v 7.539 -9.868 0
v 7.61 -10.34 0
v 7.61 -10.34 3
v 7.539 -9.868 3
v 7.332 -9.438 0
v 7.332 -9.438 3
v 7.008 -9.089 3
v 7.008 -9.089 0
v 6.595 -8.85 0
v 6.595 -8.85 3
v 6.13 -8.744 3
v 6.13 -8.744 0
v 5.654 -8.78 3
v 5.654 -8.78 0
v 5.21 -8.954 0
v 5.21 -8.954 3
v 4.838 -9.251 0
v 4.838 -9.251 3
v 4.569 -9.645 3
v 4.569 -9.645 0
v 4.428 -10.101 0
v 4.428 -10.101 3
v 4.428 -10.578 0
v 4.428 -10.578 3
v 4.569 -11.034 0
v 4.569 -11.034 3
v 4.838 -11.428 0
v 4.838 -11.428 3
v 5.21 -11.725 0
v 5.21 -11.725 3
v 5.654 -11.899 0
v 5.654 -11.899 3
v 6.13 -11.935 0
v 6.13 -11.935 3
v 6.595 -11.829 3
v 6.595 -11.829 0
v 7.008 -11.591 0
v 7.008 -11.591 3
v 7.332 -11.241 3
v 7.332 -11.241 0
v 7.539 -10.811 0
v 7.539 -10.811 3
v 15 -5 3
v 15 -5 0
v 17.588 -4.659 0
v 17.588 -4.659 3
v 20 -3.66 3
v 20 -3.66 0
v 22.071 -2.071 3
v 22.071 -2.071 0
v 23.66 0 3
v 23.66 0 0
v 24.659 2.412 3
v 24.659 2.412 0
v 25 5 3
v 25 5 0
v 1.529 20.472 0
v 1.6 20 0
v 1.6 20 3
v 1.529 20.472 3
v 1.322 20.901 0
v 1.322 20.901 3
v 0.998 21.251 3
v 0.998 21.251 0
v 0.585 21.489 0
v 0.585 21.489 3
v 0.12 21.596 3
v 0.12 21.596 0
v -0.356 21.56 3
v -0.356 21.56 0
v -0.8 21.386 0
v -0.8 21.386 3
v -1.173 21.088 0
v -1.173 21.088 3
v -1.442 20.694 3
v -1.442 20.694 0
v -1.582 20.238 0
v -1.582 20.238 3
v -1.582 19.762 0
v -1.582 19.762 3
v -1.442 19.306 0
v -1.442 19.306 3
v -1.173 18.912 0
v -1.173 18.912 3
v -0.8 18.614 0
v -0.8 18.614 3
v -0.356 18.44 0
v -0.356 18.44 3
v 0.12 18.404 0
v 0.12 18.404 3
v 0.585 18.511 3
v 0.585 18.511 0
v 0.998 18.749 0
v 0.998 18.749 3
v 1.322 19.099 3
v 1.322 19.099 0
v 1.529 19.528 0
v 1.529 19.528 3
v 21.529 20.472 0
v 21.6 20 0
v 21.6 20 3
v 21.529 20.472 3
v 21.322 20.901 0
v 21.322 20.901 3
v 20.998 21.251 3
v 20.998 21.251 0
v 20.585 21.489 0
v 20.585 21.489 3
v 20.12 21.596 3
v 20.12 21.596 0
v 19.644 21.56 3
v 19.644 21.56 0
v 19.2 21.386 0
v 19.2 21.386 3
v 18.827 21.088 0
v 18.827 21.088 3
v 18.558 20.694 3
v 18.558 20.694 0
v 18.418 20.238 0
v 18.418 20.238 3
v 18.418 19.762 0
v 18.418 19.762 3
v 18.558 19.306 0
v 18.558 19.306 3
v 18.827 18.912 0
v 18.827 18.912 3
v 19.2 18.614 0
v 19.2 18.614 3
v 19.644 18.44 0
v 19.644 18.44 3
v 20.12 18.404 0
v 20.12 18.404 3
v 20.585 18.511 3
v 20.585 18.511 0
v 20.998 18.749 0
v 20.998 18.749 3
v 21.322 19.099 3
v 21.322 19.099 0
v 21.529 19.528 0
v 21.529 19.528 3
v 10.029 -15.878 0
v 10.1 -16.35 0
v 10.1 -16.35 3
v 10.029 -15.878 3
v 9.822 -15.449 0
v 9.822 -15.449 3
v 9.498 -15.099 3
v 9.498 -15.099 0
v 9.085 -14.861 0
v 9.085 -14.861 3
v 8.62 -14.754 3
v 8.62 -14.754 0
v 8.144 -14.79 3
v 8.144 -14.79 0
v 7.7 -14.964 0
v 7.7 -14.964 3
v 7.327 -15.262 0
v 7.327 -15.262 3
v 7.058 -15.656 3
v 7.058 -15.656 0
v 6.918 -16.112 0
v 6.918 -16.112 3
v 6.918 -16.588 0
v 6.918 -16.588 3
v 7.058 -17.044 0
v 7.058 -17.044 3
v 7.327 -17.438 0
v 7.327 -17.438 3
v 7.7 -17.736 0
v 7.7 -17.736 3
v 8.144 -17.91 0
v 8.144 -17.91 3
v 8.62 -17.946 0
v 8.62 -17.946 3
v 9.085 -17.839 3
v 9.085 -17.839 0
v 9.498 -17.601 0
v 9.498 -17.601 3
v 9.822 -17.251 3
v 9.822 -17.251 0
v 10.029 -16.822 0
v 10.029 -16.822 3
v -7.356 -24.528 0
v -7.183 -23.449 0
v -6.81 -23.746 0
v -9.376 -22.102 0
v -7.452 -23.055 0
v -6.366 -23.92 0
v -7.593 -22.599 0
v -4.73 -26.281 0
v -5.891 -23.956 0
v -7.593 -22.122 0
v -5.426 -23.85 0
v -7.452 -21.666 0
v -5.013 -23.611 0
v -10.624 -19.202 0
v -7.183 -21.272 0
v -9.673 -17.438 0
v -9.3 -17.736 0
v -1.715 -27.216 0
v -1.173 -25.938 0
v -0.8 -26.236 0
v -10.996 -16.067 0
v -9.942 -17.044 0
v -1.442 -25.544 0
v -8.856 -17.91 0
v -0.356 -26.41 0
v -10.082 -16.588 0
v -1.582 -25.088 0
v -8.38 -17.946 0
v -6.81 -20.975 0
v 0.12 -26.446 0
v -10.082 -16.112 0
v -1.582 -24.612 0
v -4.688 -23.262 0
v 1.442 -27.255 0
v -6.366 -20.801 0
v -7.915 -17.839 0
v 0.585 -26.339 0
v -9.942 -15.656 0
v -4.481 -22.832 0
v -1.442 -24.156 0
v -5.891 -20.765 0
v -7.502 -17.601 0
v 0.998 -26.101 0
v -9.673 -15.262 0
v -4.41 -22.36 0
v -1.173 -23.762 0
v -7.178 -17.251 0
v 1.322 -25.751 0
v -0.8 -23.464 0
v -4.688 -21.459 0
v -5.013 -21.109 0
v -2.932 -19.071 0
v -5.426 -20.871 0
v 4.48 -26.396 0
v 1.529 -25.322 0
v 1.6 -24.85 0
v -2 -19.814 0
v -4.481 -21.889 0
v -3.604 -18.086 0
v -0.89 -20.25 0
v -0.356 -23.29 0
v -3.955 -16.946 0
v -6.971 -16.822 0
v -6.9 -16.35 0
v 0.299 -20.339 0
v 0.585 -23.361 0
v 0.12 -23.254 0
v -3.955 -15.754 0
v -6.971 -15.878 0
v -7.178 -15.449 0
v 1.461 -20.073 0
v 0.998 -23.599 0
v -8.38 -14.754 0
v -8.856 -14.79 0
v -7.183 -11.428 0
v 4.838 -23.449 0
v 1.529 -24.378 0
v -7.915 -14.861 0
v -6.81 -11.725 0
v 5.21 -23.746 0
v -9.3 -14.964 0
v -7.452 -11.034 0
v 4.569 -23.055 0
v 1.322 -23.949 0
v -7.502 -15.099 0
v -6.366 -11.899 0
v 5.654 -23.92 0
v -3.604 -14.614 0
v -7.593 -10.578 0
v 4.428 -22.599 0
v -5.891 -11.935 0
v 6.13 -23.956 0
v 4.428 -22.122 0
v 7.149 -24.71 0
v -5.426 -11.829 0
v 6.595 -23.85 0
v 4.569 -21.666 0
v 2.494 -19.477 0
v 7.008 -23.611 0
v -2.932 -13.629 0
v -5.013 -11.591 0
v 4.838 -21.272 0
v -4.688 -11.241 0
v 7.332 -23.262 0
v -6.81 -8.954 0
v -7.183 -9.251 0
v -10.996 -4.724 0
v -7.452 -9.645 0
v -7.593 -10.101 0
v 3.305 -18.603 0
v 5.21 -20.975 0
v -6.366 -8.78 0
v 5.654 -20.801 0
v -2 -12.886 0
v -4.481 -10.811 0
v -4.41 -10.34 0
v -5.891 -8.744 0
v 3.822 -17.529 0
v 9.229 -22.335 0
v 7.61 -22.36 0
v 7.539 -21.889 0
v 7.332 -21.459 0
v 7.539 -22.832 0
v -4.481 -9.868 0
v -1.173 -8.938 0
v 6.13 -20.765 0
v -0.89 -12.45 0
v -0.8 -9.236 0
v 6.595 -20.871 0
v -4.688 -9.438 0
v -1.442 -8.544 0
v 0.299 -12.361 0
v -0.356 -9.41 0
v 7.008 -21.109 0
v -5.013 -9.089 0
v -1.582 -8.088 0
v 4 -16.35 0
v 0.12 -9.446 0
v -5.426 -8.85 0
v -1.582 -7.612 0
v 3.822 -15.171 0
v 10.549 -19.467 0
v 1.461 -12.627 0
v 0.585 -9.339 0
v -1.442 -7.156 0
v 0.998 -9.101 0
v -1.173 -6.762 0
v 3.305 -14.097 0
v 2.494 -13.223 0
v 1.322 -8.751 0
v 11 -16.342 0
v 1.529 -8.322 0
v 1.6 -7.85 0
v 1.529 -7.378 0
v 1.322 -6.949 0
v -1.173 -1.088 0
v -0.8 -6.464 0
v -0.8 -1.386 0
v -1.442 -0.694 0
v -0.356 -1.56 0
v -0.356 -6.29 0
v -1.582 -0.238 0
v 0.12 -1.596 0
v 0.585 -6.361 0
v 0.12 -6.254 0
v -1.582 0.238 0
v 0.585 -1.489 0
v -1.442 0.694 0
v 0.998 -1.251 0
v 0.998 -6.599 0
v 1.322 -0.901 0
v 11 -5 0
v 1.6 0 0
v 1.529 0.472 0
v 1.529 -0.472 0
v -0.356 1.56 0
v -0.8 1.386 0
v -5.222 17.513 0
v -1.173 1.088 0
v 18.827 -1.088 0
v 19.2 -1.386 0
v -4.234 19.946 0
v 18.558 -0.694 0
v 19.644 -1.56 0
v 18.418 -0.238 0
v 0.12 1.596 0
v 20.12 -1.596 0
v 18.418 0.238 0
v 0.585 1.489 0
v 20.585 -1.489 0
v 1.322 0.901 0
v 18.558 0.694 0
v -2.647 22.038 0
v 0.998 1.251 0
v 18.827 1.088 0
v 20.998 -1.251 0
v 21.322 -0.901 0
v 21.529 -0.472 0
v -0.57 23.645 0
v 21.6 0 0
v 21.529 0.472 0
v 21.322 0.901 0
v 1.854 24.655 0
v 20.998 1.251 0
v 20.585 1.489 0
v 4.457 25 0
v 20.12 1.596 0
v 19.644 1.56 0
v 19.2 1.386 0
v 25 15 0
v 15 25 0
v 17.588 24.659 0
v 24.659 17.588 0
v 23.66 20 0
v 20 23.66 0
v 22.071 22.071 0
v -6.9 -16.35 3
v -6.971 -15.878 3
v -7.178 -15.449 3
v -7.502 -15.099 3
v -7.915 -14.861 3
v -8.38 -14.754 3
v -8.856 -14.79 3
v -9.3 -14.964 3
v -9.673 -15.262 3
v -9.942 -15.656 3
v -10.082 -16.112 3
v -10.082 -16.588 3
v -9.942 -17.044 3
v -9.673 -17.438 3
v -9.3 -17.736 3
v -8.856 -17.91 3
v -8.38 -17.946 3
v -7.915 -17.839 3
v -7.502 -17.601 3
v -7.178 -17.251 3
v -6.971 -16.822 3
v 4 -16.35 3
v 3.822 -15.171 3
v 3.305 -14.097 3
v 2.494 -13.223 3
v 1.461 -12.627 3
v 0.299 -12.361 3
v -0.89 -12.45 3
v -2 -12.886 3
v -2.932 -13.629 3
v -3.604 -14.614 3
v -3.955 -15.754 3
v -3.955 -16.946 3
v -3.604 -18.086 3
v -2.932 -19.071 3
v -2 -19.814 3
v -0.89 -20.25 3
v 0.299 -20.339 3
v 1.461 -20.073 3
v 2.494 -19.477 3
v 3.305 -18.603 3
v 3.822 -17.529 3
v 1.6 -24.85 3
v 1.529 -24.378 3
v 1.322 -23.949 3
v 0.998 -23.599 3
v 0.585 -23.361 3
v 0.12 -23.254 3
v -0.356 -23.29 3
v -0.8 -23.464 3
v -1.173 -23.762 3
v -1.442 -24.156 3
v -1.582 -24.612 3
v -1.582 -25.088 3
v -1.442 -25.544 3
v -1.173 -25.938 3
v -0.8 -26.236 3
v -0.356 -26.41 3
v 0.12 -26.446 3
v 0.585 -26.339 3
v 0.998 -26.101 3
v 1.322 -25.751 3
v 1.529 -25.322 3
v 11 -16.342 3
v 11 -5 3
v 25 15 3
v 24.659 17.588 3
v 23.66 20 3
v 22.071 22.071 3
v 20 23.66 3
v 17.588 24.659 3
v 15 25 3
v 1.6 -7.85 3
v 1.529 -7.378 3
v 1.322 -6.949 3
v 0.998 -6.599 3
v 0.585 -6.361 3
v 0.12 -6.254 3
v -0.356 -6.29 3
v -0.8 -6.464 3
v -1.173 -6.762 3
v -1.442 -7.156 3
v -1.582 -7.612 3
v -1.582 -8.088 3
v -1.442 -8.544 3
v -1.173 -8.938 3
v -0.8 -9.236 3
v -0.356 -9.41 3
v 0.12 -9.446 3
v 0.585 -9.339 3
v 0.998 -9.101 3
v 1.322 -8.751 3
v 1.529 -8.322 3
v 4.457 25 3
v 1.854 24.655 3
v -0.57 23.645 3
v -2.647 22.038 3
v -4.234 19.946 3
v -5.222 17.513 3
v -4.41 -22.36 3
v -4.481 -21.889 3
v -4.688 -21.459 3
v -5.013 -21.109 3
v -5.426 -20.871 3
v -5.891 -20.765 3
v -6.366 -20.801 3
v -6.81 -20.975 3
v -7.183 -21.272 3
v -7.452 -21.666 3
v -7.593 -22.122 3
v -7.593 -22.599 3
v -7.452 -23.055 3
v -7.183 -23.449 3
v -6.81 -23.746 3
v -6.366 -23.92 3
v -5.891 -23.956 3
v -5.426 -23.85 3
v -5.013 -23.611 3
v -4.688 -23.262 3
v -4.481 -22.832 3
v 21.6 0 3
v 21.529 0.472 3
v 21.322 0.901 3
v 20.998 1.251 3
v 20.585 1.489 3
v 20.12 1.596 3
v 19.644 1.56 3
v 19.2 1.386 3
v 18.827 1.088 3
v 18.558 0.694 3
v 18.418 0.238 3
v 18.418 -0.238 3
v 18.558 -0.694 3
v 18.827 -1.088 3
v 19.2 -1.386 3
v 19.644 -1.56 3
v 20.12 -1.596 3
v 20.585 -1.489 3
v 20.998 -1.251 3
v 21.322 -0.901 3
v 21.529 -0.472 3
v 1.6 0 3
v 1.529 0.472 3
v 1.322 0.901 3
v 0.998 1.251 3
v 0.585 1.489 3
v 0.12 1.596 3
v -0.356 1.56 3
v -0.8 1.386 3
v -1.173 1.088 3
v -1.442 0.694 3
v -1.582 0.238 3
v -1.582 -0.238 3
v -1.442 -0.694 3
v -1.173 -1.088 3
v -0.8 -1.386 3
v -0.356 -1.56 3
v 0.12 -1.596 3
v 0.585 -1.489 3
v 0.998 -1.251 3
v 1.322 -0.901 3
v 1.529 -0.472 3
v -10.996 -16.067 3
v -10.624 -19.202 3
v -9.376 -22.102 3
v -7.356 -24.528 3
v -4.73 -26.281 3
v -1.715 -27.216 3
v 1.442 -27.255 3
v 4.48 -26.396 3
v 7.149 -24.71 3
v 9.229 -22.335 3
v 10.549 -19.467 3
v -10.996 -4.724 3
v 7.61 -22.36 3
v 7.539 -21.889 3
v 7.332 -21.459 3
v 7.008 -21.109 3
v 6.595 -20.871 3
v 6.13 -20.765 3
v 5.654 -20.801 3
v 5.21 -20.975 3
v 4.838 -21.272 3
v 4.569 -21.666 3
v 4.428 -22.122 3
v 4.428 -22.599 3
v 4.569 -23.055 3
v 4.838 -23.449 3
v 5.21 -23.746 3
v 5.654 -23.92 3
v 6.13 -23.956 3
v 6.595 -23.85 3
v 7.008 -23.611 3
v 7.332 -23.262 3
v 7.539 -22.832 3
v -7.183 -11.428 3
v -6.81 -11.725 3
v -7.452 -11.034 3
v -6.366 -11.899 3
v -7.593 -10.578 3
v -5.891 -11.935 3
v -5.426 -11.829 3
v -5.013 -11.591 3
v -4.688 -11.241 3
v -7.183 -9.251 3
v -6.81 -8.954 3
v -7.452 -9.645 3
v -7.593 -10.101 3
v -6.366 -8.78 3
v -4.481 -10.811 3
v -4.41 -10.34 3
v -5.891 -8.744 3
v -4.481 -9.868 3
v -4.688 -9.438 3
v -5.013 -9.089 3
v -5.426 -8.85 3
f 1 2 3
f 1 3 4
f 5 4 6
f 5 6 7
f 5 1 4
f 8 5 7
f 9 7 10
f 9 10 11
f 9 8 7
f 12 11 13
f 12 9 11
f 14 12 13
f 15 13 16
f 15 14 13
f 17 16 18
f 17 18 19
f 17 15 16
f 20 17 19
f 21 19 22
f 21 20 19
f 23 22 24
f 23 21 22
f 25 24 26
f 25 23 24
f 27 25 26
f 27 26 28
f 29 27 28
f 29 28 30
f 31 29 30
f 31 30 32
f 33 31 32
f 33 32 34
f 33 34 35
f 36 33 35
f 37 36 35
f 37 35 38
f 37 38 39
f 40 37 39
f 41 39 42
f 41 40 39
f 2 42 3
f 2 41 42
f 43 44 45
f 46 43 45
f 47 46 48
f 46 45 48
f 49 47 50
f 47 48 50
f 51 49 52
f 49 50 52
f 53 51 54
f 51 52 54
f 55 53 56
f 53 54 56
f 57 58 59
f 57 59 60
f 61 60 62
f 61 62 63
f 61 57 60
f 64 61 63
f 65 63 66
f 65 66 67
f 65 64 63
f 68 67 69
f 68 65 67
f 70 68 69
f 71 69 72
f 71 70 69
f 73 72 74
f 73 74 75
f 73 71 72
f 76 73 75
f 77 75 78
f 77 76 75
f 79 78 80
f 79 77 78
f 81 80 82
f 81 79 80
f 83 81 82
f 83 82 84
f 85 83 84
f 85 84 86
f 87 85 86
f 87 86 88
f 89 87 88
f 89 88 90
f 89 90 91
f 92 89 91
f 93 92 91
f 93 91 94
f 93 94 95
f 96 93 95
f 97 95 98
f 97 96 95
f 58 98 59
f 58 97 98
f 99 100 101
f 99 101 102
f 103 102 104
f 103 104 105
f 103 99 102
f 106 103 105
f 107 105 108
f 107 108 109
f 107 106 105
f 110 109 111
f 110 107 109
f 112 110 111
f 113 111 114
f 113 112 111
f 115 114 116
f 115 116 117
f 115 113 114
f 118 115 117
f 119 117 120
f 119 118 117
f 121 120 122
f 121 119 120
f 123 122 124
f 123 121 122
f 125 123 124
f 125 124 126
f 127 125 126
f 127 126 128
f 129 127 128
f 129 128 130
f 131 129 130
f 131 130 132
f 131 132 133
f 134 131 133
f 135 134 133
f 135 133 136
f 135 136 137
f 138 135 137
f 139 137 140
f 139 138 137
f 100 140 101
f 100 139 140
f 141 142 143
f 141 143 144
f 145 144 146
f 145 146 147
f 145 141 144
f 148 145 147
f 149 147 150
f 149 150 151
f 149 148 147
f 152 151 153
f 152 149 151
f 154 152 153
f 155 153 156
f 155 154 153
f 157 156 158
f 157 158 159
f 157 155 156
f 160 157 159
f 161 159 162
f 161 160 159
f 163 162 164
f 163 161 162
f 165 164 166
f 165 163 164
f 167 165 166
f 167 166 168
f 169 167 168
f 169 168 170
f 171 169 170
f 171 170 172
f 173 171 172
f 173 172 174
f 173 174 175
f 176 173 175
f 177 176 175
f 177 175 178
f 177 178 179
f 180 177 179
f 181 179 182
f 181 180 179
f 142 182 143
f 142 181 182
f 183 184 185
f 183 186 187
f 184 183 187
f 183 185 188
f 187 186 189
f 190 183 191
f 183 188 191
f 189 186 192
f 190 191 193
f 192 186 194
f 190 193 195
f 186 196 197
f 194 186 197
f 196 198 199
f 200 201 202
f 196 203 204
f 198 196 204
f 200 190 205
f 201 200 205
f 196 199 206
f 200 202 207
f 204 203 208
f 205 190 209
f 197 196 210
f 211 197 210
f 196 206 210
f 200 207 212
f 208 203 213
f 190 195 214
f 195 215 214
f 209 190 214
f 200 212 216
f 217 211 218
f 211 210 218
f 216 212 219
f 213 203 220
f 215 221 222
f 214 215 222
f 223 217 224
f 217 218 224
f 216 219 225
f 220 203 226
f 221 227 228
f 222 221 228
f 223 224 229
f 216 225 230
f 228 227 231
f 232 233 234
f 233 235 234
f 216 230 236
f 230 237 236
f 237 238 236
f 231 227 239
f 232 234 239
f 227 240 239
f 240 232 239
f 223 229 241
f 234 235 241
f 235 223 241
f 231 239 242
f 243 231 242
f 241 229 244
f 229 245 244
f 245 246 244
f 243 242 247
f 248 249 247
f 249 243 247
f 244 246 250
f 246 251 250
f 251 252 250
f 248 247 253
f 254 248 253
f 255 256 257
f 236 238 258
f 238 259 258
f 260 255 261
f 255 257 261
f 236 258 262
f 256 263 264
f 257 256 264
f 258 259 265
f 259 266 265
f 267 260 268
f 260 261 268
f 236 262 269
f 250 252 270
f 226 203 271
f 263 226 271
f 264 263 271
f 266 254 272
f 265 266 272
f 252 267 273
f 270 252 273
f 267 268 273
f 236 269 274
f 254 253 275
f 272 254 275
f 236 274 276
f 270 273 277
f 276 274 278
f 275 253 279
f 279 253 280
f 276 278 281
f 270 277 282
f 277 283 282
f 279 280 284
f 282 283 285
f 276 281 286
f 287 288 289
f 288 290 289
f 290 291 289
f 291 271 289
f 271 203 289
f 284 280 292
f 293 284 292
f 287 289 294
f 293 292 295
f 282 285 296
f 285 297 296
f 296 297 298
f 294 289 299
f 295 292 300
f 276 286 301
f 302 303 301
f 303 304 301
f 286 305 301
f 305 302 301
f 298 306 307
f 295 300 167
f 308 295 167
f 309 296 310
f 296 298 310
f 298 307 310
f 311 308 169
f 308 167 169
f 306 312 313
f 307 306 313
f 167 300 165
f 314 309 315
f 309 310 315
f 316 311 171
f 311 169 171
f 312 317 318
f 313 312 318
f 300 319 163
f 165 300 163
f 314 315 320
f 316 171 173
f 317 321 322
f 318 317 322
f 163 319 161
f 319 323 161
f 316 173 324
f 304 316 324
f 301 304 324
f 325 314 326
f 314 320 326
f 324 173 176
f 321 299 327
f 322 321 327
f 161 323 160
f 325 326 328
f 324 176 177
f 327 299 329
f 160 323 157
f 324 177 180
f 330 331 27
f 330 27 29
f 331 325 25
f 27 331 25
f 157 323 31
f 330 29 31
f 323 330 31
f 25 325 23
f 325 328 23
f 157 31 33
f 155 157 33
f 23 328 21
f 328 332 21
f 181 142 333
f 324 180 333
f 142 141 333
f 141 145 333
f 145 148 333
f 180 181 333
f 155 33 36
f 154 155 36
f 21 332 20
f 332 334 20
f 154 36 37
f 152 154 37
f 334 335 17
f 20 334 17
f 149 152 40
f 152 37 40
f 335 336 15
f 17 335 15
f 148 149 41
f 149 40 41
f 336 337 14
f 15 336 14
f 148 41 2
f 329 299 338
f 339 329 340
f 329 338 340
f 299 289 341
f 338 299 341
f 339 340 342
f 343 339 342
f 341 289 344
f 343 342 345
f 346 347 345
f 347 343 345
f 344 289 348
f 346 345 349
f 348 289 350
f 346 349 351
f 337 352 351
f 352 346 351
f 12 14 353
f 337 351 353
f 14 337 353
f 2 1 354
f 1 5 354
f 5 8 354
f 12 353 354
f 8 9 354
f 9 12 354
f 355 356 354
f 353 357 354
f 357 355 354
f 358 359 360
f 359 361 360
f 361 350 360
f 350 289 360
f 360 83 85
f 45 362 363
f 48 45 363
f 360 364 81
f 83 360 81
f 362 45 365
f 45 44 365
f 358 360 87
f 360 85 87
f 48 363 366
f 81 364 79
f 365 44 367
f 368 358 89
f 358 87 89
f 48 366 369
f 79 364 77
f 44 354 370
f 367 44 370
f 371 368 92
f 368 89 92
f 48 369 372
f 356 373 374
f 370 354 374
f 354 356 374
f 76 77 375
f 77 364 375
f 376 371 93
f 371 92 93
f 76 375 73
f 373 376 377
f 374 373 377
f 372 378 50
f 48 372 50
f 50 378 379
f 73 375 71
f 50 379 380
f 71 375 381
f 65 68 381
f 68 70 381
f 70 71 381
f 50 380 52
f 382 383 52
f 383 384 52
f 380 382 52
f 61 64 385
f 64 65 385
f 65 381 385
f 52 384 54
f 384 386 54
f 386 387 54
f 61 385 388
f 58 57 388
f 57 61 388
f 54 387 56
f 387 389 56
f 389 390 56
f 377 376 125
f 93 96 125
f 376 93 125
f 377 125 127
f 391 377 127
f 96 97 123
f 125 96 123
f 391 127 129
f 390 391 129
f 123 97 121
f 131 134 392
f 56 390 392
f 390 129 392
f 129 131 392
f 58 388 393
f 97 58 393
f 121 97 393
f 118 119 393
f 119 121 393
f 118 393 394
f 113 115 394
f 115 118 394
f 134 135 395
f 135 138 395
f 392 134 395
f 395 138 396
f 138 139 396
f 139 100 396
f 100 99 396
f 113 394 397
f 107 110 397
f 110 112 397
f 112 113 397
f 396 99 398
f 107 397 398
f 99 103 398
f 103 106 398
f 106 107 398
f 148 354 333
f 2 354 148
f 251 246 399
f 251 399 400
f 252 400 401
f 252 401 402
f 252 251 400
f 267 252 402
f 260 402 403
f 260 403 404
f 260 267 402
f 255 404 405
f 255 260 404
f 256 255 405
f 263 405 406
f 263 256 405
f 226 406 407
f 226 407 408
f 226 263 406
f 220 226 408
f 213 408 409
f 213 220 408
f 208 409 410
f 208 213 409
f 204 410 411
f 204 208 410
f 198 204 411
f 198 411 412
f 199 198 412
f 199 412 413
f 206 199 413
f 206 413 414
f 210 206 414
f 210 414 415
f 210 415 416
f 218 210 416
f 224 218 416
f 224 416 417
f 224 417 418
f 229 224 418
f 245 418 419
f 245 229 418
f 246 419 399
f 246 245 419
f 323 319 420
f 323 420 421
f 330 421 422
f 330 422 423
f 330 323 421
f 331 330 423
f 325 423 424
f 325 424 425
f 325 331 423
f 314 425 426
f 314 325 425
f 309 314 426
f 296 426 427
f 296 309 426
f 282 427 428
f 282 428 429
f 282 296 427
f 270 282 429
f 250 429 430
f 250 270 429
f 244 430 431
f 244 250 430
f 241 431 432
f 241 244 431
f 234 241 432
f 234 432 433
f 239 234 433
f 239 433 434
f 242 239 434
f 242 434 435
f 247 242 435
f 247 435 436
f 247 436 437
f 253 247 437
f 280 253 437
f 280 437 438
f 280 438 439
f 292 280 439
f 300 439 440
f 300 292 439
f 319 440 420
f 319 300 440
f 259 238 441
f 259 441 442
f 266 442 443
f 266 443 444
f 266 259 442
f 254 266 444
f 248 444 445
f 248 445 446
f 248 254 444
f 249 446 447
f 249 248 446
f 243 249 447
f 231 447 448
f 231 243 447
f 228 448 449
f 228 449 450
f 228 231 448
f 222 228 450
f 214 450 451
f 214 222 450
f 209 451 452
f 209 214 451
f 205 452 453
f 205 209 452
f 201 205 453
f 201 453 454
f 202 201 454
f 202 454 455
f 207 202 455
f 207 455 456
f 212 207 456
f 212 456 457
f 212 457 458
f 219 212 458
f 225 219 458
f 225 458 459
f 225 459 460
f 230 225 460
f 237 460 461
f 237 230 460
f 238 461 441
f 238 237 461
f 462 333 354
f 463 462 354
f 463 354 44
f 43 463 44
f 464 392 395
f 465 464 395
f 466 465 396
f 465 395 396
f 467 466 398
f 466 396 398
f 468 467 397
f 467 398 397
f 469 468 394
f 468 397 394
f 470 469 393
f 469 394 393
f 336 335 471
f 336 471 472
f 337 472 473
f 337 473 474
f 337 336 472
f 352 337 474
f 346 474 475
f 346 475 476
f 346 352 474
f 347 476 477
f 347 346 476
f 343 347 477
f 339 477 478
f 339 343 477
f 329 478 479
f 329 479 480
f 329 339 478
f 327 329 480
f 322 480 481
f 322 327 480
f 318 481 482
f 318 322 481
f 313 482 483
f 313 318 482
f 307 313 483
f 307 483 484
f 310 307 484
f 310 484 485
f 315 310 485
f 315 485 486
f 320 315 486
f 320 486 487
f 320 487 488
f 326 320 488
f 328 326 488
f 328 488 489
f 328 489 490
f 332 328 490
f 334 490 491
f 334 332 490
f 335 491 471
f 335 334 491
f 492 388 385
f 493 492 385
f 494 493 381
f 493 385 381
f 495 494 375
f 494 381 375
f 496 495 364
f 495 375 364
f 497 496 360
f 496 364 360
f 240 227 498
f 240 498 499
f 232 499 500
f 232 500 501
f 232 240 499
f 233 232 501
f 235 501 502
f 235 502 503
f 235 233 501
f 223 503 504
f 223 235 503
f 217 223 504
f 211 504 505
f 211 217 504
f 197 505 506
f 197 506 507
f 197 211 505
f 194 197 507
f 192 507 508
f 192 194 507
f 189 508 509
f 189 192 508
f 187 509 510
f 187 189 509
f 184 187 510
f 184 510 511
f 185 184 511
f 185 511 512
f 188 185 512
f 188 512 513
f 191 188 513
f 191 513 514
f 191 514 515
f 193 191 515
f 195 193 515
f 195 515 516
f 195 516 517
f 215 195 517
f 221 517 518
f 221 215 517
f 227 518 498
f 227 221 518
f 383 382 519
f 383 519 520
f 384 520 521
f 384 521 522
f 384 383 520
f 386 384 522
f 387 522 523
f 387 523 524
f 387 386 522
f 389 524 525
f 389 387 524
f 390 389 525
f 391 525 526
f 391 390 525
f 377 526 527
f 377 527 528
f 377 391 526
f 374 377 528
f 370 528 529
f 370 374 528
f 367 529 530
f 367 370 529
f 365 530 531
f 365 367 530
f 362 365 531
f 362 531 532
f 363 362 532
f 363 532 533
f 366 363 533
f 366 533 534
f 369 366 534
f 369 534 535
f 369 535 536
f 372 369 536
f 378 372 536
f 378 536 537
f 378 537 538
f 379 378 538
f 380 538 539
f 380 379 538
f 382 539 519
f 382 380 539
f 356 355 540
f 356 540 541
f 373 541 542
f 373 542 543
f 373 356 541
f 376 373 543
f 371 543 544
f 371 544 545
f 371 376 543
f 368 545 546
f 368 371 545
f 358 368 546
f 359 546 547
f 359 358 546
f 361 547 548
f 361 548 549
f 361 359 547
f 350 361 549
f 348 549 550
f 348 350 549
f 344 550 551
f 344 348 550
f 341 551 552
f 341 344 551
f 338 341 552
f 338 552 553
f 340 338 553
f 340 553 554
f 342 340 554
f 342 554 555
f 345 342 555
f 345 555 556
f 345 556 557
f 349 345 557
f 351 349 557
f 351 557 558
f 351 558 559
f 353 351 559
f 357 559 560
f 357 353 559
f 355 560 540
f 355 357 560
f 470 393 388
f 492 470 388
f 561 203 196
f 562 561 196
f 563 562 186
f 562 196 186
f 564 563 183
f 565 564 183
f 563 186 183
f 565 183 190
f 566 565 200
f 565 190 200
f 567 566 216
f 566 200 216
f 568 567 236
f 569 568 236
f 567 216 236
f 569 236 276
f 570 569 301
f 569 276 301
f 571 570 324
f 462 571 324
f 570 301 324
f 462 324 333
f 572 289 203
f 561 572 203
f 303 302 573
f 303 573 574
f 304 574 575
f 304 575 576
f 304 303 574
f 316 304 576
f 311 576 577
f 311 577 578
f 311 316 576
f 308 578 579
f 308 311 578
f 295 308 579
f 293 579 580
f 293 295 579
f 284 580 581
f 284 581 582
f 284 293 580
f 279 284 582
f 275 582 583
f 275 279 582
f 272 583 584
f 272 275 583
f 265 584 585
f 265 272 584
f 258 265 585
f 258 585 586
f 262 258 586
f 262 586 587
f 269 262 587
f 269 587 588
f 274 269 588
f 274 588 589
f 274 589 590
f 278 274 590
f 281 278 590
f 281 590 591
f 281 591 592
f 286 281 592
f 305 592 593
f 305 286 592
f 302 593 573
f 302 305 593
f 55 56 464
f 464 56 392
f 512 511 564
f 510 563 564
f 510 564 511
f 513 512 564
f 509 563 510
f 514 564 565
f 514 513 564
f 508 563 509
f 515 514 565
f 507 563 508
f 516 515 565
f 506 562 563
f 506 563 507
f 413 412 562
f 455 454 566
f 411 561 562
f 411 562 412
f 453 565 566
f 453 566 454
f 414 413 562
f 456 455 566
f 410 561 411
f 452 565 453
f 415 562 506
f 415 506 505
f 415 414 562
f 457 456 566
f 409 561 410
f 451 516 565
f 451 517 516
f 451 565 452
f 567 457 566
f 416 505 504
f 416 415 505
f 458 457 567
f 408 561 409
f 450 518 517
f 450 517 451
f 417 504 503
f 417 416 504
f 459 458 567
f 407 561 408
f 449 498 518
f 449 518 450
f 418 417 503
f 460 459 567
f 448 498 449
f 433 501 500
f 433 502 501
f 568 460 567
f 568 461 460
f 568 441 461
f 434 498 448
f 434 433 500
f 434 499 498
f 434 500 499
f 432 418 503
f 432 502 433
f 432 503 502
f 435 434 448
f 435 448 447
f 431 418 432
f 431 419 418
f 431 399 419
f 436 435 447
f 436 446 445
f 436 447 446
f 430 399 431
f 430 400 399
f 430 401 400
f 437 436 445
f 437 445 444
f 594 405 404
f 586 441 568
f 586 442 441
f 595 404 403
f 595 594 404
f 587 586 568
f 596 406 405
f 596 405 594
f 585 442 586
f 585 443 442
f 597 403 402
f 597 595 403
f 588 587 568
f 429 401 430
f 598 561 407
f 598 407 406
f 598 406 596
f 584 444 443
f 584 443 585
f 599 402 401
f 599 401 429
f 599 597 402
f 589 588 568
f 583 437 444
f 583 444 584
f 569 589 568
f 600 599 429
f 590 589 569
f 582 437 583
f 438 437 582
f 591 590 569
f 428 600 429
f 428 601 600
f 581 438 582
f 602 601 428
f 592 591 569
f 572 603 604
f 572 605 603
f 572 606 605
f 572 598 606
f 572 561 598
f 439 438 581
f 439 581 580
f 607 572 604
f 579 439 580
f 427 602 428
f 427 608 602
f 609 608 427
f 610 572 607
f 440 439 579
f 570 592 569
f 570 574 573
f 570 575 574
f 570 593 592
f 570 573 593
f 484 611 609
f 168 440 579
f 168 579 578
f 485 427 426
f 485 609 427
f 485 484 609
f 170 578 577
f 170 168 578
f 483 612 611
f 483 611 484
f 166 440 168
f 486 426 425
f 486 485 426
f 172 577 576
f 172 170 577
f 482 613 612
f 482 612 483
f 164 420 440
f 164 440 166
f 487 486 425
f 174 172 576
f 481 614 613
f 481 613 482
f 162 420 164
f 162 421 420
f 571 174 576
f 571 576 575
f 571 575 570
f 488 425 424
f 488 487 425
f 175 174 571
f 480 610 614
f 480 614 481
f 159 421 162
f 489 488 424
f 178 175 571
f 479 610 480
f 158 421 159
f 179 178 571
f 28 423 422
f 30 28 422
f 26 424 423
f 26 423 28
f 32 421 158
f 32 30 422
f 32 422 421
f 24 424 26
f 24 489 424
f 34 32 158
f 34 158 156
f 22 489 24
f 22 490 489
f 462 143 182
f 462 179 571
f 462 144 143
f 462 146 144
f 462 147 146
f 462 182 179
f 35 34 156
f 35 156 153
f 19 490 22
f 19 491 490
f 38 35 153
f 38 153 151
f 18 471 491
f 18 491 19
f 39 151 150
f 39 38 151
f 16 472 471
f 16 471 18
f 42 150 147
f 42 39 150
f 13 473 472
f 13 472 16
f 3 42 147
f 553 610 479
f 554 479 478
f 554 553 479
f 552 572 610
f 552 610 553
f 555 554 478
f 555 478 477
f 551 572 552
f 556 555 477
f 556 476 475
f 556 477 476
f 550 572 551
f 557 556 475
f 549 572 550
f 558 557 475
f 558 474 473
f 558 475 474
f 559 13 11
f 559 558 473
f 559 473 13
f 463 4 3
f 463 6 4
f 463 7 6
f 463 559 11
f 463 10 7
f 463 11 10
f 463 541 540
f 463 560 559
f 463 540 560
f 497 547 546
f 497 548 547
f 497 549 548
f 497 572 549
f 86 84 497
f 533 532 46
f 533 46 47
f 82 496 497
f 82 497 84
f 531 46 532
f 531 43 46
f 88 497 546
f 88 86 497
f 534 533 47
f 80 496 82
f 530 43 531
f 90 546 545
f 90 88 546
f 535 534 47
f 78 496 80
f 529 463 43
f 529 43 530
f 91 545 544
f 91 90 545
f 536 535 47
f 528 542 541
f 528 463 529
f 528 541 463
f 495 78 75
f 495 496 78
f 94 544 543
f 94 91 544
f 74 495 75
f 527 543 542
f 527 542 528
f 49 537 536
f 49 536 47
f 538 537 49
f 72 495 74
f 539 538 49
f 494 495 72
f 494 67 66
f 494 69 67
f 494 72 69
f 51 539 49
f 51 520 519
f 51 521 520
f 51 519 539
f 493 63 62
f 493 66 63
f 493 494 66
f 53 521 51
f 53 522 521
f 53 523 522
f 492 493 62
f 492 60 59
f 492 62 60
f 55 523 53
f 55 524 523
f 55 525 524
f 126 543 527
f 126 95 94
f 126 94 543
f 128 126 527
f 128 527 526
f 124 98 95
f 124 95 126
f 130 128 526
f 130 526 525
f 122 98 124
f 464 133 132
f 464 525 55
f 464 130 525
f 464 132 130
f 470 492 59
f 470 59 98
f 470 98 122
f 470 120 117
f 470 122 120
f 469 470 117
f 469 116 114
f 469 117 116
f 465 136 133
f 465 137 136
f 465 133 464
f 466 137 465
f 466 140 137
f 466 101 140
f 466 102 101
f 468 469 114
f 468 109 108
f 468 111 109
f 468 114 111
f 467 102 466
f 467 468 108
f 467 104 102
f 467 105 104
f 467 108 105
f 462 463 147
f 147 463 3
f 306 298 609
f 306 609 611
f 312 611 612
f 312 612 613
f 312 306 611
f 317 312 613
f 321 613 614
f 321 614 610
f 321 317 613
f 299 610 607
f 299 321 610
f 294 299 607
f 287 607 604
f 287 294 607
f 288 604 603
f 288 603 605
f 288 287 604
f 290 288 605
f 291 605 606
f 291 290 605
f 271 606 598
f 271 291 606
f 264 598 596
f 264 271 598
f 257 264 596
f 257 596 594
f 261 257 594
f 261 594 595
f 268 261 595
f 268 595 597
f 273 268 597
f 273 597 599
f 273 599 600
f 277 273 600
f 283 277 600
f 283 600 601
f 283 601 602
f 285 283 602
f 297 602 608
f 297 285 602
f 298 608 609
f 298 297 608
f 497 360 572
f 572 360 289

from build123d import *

# Parameters (mm, degrees)
SKETCH_1_R      = 1.6
SKETCH_1_R_2    = 4
EXTRUDE_1_DEPTH = 3


with BuildPart() as part:
    # Sketch 1 → 填料-伸長1 (new body)
    with BuildSketch(Plane.XY):
        with BuildLine():
            Line((-5.221972445, 17.513309351), (-10.996349884, -4.724410549))
            Line((-10.996349884, -4.724410549), (-10.996349884, -16.06664646))
            ThreePointArc((-10.996349884, -16.06664646), (-0.137806793, -27.349136752), (10.99999726, -16.342235911))
            Line((10.99999726, -16.342235911), (10.99999726, -5))
            Line((10.99999726, -5), (15, -5))
            ThreePointArc((15, -5), (22.071067812, -2.071067812), (25, 5))
            Line((25, 5), (25, 15))
            ThreePointArc((25, 15), (22.071067812, 22.071067812), (15, 25))
            Line((15, 25), (4.4570397, 25))
            ThreePointArc((4.4570397, 25), (-1.661248724, 22.909901817), (-5.221972445, 17.513309351))
        make_face()
        with Locations((20, 20)):
            Circle(SKETCH_1_R, mode=Mode.SUBTRACT)
        with Locations((0, 20)):
            Circle(SKETCH_1_R, mode=Mode.SUBTRACT)
        Circle(SKETCH_1_R, mode=Mode.SUBTRACT)
        with Locations((20, 0)):
            Circle(SKETCH_1_R, mode=Mode.SUBTRACT)
        with Locations((0, -16.35)):
            Circle(SKETCH_1_R_2, mode=Mode.SUBTRACT)
        with Locations((8.5, -16.35)):
            Circle(SKETCH_1_R, mode=Mode.SUBTRACT)
        with Locations((6.01040764, -22.36040764)):
            Circle(SKETCH_1_R, mode=Mode.SUBTRACT)
        with Locations((0, -24.85)):
            Circle(SKETCH_1_R, mode=Mode.SUBTRACT)
        with Locations((-6.01040764, -22.36040764)):
            Circle(SKETCH_1_R, mode=Mode.SUBTRACT)
        with Locations((-8.5, -16.35)):
            Circle(SKETCH_1_R, mode=Mode.SUBTRACT)
        with Locations((-6.01040764, -10.33959236)):
            Circle(SKETCH_1_R, mode=Mode.SUBTRACT)
        with Locations((0, -7.85)):
            Circle(SKETCH_1_R, mode=Mode.SUBTRACT)
        with Locations((6.01040764, -10.33959236)):
            Circle(SKETCH_1_R, mode=Mode.SUBTRACT)
    extrude(amount=EXTRUDE_1_DEPTH)


solid = part.part
